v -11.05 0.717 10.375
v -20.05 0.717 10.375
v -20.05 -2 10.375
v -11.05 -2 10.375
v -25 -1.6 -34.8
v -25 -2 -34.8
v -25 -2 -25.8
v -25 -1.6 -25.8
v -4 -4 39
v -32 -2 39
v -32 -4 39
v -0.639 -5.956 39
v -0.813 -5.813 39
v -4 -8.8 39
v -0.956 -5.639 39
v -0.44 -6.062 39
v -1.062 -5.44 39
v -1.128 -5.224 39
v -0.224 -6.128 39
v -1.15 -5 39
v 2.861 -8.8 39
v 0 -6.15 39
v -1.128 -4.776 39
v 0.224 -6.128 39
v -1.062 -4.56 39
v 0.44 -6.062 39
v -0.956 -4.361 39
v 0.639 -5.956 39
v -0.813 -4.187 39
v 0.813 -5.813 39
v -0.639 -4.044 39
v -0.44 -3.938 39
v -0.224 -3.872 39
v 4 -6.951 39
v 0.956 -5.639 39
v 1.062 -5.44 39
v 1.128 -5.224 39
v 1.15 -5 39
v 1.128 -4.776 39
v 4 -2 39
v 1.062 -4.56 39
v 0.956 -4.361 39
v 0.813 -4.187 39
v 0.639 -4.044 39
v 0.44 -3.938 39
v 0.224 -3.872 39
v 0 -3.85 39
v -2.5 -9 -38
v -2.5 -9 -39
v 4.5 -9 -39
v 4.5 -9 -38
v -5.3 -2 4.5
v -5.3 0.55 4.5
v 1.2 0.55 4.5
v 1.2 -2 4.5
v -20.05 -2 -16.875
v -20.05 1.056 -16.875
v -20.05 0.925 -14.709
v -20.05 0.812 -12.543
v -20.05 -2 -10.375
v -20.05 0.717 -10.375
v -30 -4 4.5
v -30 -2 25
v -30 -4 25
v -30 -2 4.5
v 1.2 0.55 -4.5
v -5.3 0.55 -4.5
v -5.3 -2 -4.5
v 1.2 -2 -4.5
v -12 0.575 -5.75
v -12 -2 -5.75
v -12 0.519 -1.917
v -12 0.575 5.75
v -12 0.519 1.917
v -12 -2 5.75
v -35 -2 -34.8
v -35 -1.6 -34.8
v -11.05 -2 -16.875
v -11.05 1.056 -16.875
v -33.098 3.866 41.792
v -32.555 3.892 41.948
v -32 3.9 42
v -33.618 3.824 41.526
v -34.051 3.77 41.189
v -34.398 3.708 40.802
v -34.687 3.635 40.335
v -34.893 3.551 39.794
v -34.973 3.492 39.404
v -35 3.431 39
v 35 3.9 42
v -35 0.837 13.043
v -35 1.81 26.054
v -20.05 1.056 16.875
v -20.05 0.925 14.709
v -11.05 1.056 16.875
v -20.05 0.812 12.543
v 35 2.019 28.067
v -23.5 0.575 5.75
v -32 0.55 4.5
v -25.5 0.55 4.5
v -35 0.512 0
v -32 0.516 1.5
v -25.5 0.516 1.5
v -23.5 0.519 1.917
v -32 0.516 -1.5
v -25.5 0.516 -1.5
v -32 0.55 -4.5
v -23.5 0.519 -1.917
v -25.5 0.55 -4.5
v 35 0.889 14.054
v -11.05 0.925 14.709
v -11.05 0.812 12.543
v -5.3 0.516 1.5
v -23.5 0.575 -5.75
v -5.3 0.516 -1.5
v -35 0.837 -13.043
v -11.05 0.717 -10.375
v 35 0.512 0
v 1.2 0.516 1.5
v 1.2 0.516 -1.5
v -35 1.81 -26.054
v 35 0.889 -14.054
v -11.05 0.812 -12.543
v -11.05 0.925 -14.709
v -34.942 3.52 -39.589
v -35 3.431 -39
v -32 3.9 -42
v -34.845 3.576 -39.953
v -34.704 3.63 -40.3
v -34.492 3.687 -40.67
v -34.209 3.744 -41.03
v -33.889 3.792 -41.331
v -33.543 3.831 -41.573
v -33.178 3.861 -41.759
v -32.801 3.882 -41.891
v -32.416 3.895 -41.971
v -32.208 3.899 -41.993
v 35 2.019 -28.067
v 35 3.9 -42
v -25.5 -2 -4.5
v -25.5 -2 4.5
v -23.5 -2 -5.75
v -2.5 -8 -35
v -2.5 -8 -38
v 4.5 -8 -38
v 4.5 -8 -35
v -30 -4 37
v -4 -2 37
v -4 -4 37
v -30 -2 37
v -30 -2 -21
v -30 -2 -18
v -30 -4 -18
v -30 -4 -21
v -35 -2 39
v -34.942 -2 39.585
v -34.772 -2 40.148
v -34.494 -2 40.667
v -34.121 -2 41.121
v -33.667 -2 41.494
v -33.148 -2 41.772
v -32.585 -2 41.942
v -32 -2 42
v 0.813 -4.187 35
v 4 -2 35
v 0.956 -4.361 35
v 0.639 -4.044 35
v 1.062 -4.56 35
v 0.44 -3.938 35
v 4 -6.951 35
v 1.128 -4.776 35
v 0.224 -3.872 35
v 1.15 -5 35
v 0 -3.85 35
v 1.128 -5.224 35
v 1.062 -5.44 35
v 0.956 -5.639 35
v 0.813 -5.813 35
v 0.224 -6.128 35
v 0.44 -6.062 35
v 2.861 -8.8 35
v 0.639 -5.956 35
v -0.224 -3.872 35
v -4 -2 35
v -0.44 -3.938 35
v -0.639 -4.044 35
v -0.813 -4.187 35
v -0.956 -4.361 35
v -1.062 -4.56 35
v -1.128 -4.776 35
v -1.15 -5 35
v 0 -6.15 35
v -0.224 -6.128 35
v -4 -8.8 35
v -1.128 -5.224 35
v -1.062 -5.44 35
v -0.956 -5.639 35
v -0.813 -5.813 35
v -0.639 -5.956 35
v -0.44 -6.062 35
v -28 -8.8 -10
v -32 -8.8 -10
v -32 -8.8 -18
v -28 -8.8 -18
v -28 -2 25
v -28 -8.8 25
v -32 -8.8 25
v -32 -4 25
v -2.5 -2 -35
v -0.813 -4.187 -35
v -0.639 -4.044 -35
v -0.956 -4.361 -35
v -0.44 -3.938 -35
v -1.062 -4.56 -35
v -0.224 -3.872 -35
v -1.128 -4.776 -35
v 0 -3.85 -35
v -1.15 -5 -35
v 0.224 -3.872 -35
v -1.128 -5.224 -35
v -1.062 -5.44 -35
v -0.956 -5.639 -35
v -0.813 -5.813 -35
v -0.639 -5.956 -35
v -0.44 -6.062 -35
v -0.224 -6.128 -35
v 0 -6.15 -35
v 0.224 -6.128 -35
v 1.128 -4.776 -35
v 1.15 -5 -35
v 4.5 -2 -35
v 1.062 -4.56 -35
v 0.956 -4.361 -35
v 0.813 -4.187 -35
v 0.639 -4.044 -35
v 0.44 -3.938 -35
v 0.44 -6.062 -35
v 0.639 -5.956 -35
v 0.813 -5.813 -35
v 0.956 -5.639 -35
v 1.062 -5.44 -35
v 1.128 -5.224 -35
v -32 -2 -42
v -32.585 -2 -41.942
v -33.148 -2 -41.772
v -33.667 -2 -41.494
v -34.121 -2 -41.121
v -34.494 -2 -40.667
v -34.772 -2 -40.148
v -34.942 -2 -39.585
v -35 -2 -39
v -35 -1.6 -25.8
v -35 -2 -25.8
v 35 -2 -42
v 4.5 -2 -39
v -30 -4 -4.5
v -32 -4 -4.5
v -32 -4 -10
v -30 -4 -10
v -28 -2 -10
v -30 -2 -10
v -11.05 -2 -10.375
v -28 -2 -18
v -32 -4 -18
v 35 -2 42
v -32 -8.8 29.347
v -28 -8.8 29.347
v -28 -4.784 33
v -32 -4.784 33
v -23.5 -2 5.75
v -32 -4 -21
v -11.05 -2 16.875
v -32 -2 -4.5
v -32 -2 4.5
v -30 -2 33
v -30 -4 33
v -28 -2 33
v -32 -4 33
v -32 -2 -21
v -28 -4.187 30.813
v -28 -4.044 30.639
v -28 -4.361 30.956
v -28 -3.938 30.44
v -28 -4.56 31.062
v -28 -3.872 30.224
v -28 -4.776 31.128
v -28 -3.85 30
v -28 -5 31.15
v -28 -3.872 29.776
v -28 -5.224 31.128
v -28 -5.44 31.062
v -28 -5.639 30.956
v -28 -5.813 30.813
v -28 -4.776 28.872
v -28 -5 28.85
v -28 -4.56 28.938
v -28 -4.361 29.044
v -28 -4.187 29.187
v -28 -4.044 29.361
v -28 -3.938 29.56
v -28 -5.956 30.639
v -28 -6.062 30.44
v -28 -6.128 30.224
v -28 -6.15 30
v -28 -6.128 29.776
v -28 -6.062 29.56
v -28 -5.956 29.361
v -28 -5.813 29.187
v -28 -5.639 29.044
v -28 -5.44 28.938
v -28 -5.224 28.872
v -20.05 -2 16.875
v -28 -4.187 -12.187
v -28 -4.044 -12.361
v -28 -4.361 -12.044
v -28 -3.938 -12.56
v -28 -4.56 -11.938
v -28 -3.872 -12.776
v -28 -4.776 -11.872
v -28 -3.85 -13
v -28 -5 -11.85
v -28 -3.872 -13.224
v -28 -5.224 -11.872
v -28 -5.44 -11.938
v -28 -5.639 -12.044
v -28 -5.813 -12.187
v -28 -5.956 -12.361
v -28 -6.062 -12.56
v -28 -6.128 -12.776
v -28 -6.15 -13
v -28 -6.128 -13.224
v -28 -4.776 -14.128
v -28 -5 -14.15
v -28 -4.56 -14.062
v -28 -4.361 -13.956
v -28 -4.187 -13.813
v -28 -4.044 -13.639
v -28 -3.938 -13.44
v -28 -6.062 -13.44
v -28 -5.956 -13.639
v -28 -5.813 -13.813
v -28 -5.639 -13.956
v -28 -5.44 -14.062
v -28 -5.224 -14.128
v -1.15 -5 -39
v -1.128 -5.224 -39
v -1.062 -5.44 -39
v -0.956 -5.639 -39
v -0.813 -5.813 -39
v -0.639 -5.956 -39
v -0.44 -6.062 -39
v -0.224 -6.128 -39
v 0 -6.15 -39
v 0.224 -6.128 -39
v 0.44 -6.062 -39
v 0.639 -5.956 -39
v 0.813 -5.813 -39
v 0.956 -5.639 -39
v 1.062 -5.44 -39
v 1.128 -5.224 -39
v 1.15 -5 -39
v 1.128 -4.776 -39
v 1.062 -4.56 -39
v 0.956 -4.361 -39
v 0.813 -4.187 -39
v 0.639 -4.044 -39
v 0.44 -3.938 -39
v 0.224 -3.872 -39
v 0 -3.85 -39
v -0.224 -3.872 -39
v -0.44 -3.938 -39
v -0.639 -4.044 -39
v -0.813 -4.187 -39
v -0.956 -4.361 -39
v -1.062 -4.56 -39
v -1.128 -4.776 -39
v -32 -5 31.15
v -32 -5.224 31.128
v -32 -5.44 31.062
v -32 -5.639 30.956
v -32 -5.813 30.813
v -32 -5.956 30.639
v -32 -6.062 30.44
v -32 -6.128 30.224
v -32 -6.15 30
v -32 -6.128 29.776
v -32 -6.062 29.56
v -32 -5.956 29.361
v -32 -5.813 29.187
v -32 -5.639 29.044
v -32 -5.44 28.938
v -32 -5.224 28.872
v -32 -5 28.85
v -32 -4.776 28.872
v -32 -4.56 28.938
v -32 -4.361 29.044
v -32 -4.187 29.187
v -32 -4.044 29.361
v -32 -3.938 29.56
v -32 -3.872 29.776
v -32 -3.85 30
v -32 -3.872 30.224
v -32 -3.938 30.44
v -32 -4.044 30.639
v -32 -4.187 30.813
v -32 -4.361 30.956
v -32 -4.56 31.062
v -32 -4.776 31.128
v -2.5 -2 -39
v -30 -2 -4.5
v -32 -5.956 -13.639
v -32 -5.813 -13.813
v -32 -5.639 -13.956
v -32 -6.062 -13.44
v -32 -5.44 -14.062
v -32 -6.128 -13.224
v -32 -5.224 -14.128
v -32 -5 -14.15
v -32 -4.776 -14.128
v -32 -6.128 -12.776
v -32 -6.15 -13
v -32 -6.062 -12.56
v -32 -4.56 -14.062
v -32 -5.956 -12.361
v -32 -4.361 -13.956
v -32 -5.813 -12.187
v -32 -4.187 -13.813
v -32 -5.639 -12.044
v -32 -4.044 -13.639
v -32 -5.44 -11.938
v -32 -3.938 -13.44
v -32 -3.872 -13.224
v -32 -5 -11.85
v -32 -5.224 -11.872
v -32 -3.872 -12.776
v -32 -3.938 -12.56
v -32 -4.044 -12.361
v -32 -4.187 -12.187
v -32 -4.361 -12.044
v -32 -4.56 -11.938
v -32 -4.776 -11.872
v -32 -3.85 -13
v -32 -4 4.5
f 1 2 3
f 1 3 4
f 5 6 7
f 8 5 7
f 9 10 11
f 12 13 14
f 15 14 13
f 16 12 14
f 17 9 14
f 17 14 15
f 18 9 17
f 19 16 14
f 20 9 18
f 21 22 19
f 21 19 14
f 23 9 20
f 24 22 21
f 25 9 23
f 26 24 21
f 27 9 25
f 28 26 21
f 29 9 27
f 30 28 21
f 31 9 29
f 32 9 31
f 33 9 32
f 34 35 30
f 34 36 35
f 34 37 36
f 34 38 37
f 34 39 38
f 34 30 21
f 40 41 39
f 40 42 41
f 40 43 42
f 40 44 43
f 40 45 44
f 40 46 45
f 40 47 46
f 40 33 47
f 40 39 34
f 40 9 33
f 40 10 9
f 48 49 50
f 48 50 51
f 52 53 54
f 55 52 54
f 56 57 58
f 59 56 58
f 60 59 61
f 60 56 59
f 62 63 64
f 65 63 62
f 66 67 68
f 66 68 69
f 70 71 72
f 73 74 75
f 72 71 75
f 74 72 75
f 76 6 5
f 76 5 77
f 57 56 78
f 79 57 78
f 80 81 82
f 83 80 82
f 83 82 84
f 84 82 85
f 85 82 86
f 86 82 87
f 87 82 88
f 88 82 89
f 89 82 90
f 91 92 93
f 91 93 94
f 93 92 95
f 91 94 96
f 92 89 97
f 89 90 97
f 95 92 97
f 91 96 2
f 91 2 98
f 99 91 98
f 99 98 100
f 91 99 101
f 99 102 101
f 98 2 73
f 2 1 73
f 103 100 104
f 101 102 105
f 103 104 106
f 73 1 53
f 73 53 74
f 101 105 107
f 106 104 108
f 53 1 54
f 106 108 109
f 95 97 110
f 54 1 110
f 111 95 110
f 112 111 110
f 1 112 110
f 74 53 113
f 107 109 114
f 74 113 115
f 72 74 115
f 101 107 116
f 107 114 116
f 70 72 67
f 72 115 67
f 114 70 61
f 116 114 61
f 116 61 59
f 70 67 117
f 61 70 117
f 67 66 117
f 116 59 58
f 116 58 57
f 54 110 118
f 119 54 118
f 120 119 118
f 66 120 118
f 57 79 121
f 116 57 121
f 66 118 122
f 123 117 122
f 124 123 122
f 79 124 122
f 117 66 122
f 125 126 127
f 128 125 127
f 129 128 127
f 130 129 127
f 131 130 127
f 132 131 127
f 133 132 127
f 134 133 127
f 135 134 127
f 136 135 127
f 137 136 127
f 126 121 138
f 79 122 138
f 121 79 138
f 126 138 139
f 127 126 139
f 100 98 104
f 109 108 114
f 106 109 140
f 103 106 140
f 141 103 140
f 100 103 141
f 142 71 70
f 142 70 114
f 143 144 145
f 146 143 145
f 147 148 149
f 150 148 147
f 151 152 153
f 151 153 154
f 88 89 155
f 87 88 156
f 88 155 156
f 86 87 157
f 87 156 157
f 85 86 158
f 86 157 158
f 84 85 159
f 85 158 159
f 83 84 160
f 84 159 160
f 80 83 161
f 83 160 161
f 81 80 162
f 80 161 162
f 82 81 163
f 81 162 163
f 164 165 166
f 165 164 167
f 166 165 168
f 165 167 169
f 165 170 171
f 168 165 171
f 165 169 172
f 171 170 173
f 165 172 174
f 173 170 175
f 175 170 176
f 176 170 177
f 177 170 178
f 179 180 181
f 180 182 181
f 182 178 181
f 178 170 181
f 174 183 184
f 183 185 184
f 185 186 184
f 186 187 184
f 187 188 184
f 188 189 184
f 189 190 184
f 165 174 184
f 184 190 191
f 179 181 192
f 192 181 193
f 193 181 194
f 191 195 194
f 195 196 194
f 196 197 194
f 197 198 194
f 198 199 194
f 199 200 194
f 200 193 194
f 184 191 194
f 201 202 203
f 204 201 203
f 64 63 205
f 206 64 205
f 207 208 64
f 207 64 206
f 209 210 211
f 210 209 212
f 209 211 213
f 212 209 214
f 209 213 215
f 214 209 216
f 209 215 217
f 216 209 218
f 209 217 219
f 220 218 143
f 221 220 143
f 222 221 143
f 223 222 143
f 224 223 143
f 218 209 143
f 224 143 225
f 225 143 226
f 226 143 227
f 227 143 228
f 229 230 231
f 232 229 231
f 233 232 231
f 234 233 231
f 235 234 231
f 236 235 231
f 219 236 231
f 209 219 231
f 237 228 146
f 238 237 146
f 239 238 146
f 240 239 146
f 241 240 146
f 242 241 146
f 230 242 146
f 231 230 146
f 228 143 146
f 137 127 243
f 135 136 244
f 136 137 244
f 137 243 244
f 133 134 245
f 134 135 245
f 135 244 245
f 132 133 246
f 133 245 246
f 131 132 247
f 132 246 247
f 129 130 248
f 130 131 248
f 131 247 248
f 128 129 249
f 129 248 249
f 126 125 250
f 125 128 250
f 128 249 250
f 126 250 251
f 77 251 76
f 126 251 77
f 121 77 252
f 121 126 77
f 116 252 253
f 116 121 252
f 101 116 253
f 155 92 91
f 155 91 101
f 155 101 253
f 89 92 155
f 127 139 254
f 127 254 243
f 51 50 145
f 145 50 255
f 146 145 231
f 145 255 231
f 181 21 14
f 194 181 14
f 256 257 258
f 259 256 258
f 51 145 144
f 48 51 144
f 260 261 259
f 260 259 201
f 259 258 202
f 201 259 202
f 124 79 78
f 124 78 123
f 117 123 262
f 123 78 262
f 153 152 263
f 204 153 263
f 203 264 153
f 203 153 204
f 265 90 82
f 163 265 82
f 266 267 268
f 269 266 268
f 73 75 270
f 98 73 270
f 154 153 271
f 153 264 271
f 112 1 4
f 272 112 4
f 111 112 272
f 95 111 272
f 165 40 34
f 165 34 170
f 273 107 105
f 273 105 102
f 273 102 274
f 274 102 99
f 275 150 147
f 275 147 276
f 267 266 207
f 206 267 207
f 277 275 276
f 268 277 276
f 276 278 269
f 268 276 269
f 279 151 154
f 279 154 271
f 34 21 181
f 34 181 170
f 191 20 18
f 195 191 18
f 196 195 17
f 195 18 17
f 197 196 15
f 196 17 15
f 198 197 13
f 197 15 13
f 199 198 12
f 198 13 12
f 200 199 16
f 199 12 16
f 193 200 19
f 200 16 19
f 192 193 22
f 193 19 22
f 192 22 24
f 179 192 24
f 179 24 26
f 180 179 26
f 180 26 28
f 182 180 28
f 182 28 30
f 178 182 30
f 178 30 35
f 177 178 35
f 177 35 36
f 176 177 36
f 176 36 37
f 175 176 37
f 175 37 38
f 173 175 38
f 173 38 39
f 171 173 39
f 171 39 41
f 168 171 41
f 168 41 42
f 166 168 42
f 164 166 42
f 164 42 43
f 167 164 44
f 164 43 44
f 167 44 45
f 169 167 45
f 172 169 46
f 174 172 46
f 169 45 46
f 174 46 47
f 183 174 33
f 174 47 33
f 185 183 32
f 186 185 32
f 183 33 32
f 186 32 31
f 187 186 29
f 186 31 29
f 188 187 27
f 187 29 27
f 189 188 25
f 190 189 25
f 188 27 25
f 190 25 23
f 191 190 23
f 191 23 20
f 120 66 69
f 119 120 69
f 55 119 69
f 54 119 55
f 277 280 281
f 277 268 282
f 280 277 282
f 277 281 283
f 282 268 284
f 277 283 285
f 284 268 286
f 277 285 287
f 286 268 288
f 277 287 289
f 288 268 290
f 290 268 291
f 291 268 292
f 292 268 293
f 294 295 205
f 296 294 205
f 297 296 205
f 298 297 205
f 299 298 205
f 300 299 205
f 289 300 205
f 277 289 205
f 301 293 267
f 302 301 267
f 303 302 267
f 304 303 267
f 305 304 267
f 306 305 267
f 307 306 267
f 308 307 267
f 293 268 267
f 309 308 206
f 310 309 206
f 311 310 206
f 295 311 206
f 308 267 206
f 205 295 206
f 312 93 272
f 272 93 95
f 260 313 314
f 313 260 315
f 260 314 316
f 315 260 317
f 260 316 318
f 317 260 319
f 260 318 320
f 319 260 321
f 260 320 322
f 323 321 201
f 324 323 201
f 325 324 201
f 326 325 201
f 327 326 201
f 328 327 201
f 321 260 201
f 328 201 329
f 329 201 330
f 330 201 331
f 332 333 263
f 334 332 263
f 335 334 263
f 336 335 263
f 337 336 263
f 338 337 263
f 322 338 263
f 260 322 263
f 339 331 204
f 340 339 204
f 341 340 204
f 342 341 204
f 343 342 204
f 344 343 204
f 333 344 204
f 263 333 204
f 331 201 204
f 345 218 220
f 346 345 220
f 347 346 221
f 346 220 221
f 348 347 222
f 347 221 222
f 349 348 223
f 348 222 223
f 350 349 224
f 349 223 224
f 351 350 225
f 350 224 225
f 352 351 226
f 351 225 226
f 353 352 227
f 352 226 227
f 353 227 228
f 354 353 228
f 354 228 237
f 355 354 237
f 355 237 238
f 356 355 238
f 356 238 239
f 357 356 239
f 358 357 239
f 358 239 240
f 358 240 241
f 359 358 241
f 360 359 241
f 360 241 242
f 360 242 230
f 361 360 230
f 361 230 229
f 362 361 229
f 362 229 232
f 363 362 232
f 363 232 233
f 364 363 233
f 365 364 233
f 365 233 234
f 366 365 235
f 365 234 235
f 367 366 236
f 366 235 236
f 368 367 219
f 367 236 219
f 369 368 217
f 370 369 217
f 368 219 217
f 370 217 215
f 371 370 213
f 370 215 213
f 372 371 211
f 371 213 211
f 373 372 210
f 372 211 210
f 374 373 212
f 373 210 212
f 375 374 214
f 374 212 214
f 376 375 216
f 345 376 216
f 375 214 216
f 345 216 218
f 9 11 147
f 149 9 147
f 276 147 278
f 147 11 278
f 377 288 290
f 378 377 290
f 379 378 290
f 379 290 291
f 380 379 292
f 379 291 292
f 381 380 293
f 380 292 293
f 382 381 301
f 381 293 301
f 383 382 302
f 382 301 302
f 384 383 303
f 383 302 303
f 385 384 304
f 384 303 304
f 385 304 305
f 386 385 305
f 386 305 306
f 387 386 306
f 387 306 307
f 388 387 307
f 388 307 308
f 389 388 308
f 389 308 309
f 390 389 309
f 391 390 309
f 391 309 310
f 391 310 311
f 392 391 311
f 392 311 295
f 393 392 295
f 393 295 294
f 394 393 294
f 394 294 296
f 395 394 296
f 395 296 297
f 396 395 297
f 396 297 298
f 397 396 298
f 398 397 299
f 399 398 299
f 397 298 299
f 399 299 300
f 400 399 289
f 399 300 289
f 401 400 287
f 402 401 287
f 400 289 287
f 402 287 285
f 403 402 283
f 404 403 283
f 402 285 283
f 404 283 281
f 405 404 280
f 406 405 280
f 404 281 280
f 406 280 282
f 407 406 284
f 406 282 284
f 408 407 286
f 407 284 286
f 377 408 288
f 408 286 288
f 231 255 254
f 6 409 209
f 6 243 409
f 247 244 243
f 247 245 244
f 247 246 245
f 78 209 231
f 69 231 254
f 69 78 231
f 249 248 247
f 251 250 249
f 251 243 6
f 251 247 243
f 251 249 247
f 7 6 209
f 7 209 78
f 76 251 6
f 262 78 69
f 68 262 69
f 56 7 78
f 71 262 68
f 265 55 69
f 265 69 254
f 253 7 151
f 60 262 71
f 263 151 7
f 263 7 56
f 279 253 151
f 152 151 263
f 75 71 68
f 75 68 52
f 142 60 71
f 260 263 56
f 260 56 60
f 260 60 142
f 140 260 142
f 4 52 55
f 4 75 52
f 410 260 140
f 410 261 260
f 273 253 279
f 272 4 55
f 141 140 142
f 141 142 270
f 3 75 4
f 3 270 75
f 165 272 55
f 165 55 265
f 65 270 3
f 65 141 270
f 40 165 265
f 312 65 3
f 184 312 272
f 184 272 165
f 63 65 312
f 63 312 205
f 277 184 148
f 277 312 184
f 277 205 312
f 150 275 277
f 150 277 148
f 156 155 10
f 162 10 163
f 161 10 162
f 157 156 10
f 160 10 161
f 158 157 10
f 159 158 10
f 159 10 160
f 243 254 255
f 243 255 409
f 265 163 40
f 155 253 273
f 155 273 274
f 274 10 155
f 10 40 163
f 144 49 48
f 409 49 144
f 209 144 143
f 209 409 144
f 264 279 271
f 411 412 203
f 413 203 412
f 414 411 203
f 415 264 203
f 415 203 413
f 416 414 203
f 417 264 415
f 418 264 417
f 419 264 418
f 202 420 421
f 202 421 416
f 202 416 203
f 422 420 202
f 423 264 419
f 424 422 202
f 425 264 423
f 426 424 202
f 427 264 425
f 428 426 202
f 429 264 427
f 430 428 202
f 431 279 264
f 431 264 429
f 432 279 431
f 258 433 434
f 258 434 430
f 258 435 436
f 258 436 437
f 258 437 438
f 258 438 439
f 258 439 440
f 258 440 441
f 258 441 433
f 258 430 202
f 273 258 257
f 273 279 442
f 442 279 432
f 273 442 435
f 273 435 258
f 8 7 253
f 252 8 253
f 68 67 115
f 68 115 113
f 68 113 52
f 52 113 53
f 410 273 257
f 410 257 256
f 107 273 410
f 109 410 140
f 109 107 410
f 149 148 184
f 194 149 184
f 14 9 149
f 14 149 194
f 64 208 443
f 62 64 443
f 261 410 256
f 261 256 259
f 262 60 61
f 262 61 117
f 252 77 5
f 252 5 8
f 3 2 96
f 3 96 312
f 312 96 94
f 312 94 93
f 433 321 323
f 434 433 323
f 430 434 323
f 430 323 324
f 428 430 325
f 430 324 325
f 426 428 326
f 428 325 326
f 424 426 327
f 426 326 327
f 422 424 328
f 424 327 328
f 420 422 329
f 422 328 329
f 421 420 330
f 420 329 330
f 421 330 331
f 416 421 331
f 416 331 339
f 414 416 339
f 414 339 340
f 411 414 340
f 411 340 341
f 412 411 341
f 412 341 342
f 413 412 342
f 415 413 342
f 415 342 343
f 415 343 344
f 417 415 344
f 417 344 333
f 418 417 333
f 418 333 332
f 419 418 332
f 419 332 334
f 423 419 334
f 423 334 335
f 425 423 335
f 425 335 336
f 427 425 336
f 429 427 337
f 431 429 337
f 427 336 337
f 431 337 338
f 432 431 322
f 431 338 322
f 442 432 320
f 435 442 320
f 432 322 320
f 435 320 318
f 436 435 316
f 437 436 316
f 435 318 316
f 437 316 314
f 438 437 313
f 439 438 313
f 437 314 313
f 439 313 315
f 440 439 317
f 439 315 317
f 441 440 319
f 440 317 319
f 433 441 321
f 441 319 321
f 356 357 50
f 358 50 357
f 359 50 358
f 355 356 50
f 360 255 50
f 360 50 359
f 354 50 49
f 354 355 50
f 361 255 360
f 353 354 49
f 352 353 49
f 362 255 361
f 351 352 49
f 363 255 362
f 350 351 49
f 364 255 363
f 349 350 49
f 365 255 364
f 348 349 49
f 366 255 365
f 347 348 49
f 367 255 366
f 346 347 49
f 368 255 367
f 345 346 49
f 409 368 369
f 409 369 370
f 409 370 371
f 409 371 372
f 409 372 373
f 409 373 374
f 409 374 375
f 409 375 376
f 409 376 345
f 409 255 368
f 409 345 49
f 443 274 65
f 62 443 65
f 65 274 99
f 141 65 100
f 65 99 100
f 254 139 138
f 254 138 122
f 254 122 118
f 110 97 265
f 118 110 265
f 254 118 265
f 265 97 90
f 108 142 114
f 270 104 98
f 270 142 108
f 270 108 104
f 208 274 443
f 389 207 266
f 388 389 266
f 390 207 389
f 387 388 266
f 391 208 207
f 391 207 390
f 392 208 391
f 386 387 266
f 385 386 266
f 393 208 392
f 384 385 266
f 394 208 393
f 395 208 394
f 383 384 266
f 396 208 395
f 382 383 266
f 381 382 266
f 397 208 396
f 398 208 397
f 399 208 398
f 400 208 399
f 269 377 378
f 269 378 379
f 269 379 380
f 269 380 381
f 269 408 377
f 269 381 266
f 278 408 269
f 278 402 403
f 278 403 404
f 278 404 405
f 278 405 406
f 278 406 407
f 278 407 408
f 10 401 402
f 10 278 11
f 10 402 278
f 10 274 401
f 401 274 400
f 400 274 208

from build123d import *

# Parameters (mm, degrees)
SKETCH009_W             = 84
SKETCH009_H             = 70
PAD002_DEPTH            = 2
SKETCH010_W             = 2
SKETCH010_H             = 7
PAD003_DEPTH            = 2
SKETCH012_W             = 8
SKETCH012_H             = 6.8
PAD004_DEPTH            = 4
SKETCH013_W             = 7
SKETCH013_H             = 6
PAD005_DEPTH            = 4
SKETCH011_W             = 8
SKETCH011_H             = 6.8
PAD006_DEPTH            = 4
SKETCH014_R             = 1.15
POCKET002_DEPTH         = 81.001
SKETCH016_R             = 1.15
POCKET003_DEPTH         = 8.501
SKETCH018_W             = 11.5
SKETCH018_H             = 11.5
POCKET004_DEPTH         = 5
POCKET005_DEPTH         = 5
POCKET006_DEPTH         = 5
SKETCH021_W             = 1
SKETCH021_H             = 7
PAD007_DEPTH            = 1
SKETCH022_W             = 9
SKETCH022_H             = 10
POCKET007_DEPTH         = 0.4
FILLET_R                = 3
BODY002_PITCH_ANGLE     = -90
BODY002_PLACEMENT_ANGLE = 90
PAD001_DEPTH            = 35
SKETCH007_W             = 11.5
SKETCH007_H             = 11.5
POCKET001_DEPTH         = 13
FILLET001_R             = 3
SKETCH025_W             = 6.5
SKETCH025_H             = 9
SKETCH025_W_2           = 9
SKETCH025_H_2           = 6.5
POCKET008_DEPTH         = 8


with BuildPart() as back:
    # Sketch009 → Pad002 (new body)
    with BuildSketch(Plane.XY):
        Rectangle(SKETCH009_W, SKETCH009_H)
    extrude(amount=PAD002_DEPTH)

    # Sketch010 (on Face6 of Pad002) → Pad003 (join)
    with BuildSketch(Plane.XY.offset(2)):
        with Locations((-38, -1)):
            Rectangle(SKETCH010_W, SKETCH010_H)
        Polygon((-21, 32), (39, 32), (39, -4), (37, -4), (37, 30), (-21, 30), align=None)
    extrude(amount=PAD003_DEPTH)

    # Sketch012 (on Face15 of Pad003) → Pad004 (join)
    with BuildSketch(Plane.YZ.offset(39)):
        with Locations((0, 5.4)):
            Rectangle(SKETCH012_W, SKETCH012_H)
    extrude(amount=-PAD004_DEPTH)

    # Sketch013 (on Face9 of Pad004) → Pad005 (join)
    with BuildSketch(Plane(origin=(-39, 0, 0), x_dir=(0, -1, 0), z_dir=(-1, 0, 0))):
        with Locations((1, 5)):
            Rectangle(SKETCH013_W, SKETCH013_H)
    extrude(amount=-PAD005_DEPTH)

    # Sketch011 (on Face16 of Pad003) → Pad006 (join)
    with BuildSketch(Plane(origin=(0, 32, 0), x_dir=(-1, 0, 0), z_dir=(0, 1, 0))):
        with Locations((-29, 5.4)):
            Rectangle(SKETCH011_W, SKETCH011_H)
        with Locations((14, 5.4)):
            Rectangle(SKETCH011_W, SKETCH011_H)
    extrude(amount=-PAD006_DEPTH)

    # Sketch014 (on Face44 of Pad006) → Pocket002 (cut, through all)
    with BuildSketch(Plane.YZ.offset(39)):
        with Locations((0, 5)):
            Circle(SKETCH014_R)
    extrude(amount=-POCKET002_DEPTH, mode=Mode.SUBTRACT)

    # Sketch016 → Pocket003 (cut, through all)
    with BuildSketch(Plane.XZ.offset(-26.5)):
        with Locations((-13, 5)):
            Circle(SKETCH016_R)
        with Locations((30, 5)):
            Circle(SKETCH016_R)
    extrude(amount=-POCKET003_DEPTH, mode=Mode.SUBTRACT)

    # Sketch018 (on Face5 of Pocket003) → Pocket004 (cut)
    with BuildSketch(Plane.XY.offset(2)):
        with Locations((0, 17.75)):
            Rectangle(SKETCH018_W, SKETCH018_H)
    extrude(amount=-POCKET004_DEPTH, mode=Mode.SUBTRACT)

    # Sketch019 (on Face31 of Pocket004) → Pocket005 (cut)
    with BuildSketch(Plane.XZ.offset(-28)):
        Polygon((29.125944, 9.042901), (33.258869, 4.499726), (33.258869, 9.042901), align=None)
    extrude(amount=-POCKET005_DEPTH, mode=Mode.SUBTRACT)

    # Sketch020 (on Face36 of Pocket005) → Pocket006 (cut)
    with BuildSketch(Plane(origin=(35, 0, 0), x_dir=(0, -1, 0), z_dir=(-1, 0, 0))):
        Polygon((2.77547, 8.938441), (6.386171, 3.079567), (6.386171, 8.938441), align=None)
    extrude(amount=-POCKET006_DEPTH, mode=Mode.SUBTRACT)

    # Sketch021 (on Face40 of Pocket006) → Pad007 (join)
    with BuildSketch(Plane.XY.offset(8)):
        with Locations((-38.5, -1)):
            Rectangle(SKETCH021_W, SKETCH021_H)
    extrude(amount=PAD007_DEPTH)

    # Sketch022 (on Face5 of Pocket005) → Pocket007 (cut)
    with BuildSketch(Plane.XY.offset(2)):
        with Locations((-30.3, 30)):
            Rectangle(SKETCH022_W, SKETCH022_H)
    extrude(amount=-POCKET007_DEPTH, mode=Mode.SUBTRACT)

    # Fillet
    fillet_edges = [back.edges().sort_by_distance(p)[0] for p in [
        (42, 35, 1),
        (-42, 35, 1),
    ]]
    fillet(fillet_edges, radius=FILLET_R)


with BuildPart() as back_1:
    # Body002 pitch: moved
    add(back.part.rotate(Axis((0, 0, 0), (0, 1, 0)), BODY002_PITCH_ANGLE))


with BuildPart() as back_2:
    # Body002 placement: moved
    add(back_1.part.rotate(Axis((0, 0, 0), (0, 0, 1)), BODY002_PLACEMENT_ANGLE))


with BuildPart() as curve:
    # Sketch006 → Pad001 (new body, symmetric)
    with BuildSketch(Plane(origin=(0, 0, 0), x_dir=(0, 0, -1), z_dir=(1, 0, 0))):
        with BuildLine():
            ThreePointArc((-42, 3.9), (0, 0.511678), (42, 3.9))
            Line((42, -0.1), (42, 3.9))
            Line((-42, -0.1), (42, -0.1))
            Line((-42, 3.9), (-42, -0.1))
        make_face()
    extrude(amount=PAD001_DEPTH, both=True)

    # Sketch007 (on Face3 of Pad001) → Pocket001 (cut)
    with BuildSketch(Plane.XZ.offset(0.1)):
        with Locations((-17.75, 0)):
            Rectangle(SKETCH007_W, SKETCH007_H)
    extrude(amount=-POCKET001_DEPTH, mode=Mode.SUBTRACT)

    # Fillet001
    fillet001_edges = [curve.edges().sort_by_distance(p)[0] for p in [
        (-35, 1.9, -42),
        (-35, 1.9, 42),
    ]]
    fillet(fillet001_edges, radius=FILLET001_R)

    # Boolean: union Back
    add(back_2.part)

    # Sketch025 (on Face32 of Boolean) → Pocket008 (cut, symmetric)
    with BuildSketch(Plane.XZ.offset(2)):
        with Locations((-28.75, 0)):
            Rectangle(SKETCH025_W, SKETCH025_H)
        with Locations((-15.55, 13.625)):
            Rectangle(SKETCH025_W_2, SKETCH025_H_2)
        with Locations((-2.05, 0)):
            Rectangle(SKETCH025_W, SKETCH025_H)
        with Locations((-15.55, -13.625)):
            Rectangle(SKETCH025_W_2, SKETCH025_H_2)
    extrude(amount=POCKET008_DEPTH, both=True, mode=Mode.SUBTRACT)


solid = curve.part
